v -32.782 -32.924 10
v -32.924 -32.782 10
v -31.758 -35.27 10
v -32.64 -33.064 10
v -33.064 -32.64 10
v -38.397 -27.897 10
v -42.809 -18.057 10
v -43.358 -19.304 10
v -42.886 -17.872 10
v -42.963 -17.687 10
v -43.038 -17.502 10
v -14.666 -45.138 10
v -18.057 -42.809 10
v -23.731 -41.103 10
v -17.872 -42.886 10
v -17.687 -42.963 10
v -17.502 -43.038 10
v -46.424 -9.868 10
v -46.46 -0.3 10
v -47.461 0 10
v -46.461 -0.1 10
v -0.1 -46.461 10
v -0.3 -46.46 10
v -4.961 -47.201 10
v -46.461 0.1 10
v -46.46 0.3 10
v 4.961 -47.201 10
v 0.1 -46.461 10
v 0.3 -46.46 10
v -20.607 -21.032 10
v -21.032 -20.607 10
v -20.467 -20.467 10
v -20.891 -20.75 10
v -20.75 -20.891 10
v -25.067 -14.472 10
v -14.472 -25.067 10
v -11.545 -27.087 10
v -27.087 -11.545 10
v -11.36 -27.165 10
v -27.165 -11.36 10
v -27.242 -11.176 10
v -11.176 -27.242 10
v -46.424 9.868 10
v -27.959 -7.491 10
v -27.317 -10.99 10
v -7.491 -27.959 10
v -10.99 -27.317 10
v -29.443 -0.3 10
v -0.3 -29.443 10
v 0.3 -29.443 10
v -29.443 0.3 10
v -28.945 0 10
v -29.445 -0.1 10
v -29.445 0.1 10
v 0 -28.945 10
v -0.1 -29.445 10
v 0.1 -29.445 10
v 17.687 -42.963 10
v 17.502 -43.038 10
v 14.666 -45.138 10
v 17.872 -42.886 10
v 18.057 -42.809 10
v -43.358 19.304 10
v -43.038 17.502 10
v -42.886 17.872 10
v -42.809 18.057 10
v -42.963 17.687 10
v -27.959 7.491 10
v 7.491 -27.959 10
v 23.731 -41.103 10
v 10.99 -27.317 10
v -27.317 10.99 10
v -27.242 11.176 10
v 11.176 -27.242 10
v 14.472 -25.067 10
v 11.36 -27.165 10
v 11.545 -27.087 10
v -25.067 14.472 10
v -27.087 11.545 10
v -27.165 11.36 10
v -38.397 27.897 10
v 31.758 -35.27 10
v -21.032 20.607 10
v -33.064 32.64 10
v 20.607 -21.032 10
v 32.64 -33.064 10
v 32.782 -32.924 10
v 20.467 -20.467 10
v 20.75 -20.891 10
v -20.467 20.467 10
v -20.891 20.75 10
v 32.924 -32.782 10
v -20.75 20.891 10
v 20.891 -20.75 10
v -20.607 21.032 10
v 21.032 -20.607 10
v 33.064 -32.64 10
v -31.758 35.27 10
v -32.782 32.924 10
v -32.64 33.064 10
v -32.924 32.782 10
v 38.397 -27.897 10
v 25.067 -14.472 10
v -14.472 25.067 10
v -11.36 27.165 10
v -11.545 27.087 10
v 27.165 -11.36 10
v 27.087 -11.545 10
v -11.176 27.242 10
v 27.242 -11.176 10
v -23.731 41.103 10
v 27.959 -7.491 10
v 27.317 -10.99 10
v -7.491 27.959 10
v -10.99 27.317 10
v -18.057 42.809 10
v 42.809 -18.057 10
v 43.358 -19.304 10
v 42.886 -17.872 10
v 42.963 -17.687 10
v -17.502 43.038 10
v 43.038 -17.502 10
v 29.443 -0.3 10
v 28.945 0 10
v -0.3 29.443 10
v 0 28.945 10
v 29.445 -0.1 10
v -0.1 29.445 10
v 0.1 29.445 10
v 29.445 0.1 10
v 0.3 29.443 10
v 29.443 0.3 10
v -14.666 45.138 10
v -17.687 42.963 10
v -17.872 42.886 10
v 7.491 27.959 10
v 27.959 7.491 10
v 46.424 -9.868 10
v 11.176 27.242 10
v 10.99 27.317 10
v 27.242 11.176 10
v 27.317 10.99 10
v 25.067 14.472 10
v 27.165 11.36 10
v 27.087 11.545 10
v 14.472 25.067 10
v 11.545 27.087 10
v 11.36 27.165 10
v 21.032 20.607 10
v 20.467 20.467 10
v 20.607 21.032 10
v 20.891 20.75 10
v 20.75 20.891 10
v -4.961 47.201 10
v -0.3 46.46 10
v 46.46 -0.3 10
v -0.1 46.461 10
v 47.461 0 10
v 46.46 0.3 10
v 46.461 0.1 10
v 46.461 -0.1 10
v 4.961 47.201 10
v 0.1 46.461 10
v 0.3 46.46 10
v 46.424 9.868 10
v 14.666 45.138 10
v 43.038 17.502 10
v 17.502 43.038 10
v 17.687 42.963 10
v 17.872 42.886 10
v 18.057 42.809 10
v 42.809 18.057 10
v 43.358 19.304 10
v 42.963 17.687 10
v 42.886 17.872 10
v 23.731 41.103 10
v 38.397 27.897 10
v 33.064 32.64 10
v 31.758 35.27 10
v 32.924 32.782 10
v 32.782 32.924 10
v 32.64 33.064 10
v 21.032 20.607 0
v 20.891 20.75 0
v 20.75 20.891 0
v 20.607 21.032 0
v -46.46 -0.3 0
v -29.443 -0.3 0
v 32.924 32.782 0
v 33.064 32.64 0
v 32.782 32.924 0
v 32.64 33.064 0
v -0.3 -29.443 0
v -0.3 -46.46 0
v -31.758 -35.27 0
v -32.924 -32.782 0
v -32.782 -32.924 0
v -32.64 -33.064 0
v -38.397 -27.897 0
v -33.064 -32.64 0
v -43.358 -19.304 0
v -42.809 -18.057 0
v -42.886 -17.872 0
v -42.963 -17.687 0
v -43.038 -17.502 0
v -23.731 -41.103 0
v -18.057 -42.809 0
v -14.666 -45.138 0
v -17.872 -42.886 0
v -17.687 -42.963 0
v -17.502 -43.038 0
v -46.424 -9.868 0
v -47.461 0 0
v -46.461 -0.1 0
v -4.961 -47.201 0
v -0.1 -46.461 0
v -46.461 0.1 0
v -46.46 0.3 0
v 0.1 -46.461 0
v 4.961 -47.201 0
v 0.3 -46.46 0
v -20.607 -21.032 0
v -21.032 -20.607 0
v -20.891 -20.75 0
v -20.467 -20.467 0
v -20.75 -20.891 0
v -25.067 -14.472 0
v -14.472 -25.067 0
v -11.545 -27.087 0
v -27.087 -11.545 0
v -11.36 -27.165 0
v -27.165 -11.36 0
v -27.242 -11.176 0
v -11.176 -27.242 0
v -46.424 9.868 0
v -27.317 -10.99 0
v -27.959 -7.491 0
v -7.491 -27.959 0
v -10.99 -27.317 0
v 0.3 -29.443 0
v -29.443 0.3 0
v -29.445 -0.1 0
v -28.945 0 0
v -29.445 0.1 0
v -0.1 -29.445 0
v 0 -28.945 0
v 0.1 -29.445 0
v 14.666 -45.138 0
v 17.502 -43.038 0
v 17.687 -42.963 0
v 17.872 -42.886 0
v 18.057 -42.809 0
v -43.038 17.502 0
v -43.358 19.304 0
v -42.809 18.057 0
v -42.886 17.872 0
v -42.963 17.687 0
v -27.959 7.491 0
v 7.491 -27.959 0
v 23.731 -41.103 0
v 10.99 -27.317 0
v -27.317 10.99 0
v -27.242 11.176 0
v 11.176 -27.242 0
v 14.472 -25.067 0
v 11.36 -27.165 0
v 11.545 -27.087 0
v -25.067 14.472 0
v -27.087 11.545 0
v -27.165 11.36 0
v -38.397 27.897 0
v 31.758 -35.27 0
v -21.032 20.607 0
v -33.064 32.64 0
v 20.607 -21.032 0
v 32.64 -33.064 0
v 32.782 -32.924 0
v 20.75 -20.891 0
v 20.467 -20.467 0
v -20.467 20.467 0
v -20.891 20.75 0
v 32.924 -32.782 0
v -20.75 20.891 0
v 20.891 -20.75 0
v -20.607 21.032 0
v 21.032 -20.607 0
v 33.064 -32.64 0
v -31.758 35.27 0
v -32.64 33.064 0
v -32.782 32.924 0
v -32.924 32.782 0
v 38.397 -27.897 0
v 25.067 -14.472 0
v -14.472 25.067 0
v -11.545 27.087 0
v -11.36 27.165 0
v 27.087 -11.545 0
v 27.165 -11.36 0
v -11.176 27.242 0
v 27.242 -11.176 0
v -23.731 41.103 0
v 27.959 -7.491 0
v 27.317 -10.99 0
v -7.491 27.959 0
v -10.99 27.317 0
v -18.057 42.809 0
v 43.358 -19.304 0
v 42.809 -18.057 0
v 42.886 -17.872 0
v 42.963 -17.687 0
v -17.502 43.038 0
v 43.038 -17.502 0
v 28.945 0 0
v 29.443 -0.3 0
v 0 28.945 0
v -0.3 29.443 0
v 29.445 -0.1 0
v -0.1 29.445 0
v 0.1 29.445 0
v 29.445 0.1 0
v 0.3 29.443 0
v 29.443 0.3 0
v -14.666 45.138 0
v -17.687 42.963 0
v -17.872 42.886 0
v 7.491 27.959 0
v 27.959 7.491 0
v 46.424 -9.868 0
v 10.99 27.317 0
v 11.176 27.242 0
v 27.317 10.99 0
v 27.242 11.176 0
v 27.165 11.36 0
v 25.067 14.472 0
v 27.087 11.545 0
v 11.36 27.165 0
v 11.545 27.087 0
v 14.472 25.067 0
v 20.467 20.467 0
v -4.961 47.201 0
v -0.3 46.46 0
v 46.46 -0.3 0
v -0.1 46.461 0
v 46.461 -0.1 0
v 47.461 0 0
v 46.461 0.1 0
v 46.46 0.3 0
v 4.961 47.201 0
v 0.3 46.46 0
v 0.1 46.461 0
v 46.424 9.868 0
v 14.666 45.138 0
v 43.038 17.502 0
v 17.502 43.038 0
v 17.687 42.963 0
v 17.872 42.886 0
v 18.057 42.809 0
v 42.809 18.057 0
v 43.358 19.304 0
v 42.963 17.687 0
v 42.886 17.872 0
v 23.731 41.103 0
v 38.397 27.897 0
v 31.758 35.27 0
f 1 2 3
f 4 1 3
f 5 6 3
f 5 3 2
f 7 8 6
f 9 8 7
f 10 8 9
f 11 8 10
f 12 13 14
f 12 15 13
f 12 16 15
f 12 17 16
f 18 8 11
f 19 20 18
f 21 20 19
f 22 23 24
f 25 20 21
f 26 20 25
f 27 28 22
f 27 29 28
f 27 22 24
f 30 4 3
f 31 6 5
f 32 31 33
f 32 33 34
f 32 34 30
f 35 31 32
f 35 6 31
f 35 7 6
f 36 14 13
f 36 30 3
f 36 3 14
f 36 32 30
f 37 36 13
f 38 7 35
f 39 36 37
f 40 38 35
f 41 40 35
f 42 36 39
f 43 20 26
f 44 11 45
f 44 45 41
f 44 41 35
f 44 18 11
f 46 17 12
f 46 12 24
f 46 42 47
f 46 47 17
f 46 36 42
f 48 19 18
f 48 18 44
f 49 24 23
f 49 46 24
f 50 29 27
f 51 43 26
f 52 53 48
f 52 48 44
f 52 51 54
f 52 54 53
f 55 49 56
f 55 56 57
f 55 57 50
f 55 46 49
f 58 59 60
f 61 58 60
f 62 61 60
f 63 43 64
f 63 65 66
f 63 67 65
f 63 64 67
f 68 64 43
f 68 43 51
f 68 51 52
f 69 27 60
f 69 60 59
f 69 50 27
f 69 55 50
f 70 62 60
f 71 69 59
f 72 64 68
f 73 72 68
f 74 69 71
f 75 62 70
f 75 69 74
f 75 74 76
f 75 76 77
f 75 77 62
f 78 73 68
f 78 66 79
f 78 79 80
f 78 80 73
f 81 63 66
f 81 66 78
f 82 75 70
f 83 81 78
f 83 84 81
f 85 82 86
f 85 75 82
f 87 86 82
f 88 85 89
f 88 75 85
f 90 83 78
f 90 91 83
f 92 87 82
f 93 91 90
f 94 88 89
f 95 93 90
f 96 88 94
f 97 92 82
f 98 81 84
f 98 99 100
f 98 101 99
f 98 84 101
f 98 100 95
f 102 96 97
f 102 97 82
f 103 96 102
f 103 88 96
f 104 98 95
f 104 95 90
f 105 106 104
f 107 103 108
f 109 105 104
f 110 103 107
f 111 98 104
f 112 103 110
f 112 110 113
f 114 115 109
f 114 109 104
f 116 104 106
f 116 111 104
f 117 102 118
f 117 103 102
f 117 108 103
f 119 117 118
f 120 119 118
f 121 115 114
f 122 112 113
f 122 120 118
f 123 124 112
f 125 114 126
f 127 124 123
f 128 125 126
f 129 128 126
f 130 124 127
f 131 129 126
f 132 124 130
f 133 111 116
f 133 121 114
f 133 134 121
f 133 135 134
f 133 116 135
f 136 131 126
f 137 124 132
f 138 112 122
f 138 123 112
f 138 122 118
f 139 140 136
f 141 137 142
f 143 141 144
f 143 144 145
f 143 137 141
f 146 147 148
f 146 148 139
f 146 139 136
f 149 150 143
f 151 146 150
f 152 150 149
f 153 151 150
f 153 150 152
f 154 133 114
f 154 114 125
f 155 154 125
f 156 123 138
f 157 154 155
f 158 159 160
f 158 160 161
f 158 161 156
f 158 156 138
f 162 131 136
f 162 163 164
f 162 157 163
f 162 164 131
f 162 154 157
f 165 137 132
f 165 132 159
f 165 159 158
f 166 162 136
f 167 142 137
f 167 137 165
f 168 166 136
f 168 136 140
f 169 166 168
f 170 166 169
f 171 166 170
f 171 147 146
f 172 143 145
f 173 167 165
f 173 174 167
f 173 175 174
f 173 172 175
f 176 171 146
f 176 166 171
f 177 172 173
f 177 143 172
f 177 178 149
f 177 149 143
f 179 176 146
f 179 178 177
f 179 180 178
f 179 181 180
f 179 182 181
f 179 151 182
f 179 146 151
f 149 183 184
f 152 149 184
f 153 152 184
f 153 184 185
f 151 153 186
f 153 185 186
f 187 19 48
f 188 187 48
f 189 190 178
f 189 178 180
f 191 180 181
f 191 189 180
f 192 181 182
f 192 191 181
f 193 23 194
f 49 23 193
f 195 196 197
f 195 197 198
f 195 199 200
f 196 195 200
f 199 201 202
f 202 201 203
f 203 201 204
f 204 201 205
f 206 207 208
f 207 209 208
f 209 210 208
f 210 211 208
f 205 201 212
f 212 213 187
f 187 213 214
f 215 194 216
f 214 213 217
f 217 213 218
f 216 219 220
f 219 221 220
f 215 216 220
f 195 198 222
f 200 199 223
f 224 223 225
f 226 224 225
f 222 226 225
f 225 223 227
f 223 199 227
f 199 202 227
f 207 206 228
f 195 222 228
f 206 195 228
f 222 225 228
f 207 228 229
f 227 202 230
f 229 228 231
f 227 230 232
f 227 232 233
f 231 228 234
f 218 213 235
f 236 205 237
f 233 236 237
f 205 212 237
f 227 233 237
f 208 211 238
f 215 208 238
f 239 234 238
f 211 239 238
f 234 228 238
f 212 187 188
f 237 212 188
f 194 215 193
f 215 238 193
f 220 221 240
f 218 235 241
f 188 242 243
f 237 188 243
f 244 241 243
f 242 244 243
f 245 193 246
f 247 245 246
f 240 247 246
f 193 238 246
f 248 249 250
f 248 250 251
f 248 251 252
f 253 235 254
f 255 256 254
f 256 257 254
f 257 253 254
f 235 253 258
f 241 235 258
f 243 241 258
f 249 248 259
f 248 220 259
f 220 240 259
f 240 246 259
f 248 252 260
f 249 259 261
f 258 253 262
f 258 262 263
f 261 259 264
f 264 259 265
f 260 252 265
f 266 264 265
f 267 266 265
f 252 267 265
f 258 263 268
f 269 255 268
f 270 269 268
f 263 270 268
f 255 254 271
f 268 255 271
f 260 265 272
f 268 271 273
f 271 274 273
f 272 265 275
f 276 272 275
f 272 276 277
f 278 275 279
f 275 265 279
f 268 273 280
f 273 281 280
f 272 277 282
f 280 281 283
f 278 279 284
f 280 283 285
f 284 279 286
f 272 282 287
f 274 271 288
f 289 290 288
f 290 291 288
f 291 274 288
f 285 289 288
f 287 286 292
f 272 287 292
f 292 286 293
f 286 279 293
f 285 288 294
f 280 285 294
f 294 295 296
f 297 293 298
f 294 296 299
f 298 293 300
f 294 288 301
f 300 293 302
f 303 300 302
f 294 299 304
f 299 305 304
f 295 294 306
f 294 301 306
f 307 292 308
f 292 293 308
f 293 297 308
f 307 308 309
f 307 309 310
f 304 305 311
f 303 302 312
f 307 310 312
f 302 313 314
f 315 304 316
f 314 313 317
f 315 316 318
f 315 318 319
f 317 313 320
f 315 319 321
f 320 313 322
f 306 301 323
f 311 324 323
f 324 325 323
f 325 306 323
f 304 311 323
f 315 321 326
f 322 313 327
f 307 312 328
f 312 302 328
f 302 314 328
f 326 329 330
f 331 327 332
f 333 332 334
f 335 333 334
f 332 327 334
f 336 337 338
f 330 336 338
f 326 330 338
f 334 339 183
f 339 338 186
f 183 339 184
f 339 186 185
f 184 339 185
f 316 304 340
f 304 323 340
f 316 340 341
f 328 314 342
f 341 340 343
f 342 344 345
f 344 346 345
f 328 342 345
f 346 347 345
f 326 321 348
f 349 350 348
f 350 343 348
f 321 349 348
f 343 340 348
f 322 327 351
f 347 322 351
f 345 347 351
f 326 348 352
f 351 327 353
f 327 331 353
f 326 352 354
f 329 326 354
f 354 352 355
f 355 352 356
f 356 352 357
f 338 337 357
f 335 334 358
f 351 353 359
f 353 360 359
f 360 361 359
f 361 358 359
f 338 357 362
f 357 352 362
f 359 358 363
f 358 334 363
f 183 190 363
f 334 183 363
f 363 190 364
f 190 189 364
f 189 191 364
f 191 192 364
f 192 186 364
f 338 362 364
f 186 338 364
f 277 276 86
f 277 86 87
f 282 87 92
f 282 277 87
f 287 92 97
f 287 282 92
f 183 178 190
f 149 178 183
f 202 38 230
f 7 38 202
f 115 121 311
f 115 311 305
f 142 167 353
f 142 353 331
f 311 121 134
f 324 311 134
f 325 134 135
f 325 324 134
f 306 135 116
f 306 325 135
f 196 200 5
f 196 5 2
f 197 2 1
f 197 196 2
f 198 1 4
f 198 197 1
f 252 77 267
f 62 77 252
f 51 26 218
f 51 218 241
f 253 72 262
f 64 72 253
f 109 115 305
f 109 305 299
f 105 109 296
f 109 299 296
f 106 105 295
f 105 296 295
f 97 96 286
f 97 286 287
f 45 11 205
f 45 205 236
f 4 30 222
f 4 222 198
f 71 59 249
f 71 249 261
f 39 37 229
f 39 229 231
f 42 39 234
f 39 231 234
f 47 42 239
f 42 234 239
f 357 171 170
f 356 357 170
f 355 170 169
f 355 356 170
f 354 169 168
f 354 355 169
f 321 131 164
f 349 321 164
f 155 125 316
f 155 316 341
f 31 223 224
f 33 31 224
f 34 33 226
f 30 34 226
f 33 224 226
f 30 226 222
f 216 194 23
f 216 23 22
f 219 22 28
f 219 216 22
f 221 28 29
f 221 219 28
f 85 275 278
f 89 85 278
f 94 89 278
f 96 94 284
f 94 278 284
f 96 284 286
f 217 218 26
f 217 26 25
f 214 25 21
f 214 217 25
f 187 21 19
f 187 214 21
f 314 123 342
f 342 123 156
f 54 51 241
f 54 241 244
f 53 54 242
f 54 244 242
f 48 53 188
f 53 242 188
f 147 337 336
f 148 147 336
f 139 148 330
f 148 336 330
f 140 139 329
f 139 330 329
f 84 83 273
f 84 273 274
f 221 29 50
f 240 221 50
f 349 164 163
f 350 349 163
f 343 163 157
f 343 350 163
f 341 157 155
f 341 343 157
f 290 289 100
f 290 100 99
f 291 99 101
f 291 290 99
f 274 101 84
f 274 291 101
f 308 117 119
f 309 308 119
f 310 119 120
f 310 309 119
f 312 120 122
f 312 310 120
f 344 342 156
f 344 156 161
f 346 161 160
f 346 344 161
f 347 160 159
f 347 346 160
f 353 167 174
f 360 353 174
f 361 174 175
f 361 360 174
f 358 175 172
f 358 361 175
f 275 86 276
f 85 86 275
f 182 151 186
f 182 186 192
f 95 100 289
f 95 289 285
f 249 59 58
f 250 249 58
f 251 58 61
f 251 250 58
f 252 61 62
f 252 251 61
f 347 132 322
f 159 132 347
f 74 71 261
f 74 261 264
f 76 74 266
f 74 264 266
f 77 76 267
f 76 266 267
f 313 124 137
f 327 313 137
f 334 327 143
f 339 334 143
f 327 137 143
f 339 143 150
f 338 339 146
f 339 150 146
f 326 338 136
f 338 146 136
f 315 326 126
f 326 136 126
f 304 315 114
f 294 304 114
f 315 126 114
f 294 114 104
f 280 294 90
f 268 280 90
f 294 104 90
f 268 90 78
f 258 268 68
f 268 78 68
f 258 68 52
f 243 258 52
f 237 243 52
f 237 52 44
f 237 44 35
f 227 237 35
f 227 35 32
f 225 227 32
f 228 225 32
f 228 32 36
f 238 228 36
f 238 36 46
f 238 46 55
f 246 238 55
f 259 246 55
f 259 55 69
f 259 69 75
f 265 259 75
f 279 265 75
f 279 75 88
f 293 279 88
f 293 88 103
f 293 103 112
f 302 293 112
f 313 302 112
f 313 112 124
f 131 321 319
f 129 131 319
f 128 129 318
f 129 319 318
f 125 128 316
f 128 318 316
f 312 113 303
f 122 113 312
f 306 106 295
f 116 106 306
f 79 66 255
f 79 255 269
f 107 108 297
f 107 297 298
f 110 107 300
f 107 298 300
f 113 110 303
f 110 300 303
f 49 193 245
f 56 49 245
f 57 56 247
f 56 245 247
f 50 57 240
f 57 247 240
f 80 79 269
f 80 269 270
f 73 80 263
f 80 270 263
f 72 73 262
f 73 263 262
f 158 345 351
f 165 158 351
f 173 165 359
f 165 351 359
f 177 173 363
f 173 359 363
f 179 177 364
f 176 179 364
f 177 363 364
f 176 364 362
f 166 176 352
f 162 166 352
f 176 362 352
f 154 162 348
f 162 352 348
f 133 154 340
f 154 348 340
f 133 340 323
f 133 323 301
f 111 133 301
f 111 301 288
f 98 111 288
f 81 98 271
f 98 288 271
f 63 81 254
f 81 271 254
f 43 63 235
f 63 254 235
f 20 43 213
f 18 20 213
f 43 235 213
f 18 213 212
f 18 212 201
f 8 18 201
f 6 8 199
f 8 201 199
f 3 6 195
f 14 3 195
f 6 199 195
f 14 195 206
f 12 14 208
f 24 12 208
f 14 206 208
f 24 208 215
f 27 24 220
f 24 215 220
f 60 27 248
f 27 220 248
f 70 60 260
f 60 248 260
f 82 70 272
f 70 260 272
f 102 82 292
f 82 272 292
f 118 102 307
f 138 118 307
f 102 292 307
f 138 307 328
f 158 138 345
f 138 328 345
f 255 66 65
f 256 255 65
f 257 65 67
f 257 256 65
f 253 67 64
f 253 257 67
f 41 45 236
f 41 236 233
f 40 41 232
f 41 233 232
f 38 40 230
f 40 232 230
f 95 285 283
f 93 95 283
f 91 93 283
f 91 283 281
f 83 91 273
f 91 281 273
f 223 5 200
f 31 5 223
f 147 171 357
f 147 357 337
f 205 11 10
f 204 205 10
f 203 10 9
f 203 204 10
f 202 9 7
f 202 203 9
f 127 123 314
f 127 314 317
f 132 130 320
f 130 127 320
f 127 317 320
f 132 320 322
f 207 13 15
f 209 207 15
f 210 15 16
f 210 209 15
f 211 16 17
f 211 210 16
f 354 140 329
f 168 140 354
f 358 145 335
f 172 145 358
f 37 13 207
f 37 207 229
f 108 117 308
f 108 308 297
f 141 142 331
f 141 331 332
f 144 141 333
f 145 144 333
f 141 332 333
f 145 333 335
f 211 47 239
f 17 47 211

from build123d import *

# Parameters (mm, degrees)
ESQUISSE1_R             = 46.46108
BOSS_EXTRU_1_DEPTH      = 10
ESQUISSE2_R             = 29.44481
ENL_V_MAT_EXTRU_1_DEPTH = 67.462500025
ESQUISSE4_W             = 0.6
ESQUISSE4_H             = 40
ESQUISSE4_W_2           = 40
ESQUISSE4_H_2           = 0.6
ENL_V_MAT_EXTRU_2_DEPTH = 10
ESQUISSE5_R             = 29.44481
BOSS_EXTRU_2_DEPTH      = 10
ESQUISSE6_R             = 28.94481
ENL_V_MAT_EXTRU_3_DEPTH = 67.461145864
ESQUISSE7_R             = 47.46108
ESQUISSE7_R_2           = 46.46108
BOSS_EXTRU_3_DEPTH      = 10


with BuildPart() as part:
    # Esquisse1 → Boss.-Extru.1 (new body)
    with BuildSketch(Plane.XY):
        Circle(ESQUISSE1_R)
    extrude(amount=BOSS_EXTRU_1_DEPTH)

    # Esquisse2 → Enlèv. mat.-Extru.1 (cut, through all)
    with BuildSketch(Plane.XY.offset(10)):
        Circle(ESQUISSE2_R)
    extrude(amount=-ENL_V_MAT_EXTRU_1_DEPTH, mode=Mode.SUBTRACT)

    # Esquisse4 → Enlèv. mat.-Extru.2 (cut)
    with BuildSketch(Plane.XY.offset(10)):
        Polygon((23.238169802, 55.317966921), (7.930832507, 18.362785621), (7.376504788, 18.59239568), (22.683842082, 55.54757698), align=None)
        with Locations((0, 40)):
            Rectangle(ESQUISSE4_W, ESQUISSE4_H)
        Polygon((42.638538906, 42.214274837), (14.354267658, 13.930003589), (13.930003589, 14.354267658), (42.214274837, 42.638538906), align=None)
        Polygon((55.54757698, 22.683842082), (18.59239568, 7.376504788), (18.362785621, 7.930832507), (55.317966921, 23.238169802), align=None)
        with Locations((40, 0)):
            Rectangle(ESQUISSE4_W_2, ESQUISSE4_H_2)
        Polygon((55.317966921, -23.238169802), (18.362785621, -7.930832507), (18.59239568, -7.376504788), (55.54757698, -22.683842082), align=None)
        Polygon((42.214274837, -42.638538906), (13.930003589, -14.354267658), (14.354267658, -13.930003589), (42.638538906, -42.214274837), align=None)
        Polygon((22.683842082, -55.54757698), (7.376504788, -18.59239568), (7.930832507, -18.362785621), (23.238169802, -55.317966921), align=None)
        with Locations((0, -40)):
            Rectangle(ESQUISSE4_W, ESQUISSE4_H)
        Polygon((-23.238169802, -55.317966921), (-7.930832507, -18.362785621), (-7.376504788, -18.59239568), (-22.683842082, -55.54757698), align=None)
        Polygon((-42.638538906, -42.214274837), (-14.354267658, -13.930003589), (-13.930003589, -14.354267658), (-42.214274837, -42.638538906), align=None)
        Polygon((-55.54757698, -22.683842082), (-18.59239568, -7.376504788), (-18.362785621, -7.930832507), (-55.317966921, -23.238169802), align=None)
        with Locations((-40, 0)):
            Rectangle(ESQUISSE4_W_2, ESQUISSE4_H_2)
        Polygon((-55.317966921, 23.238169802), (-18.362785621, 7.930832507), (-18.59239568, 7.376504788), (-55.54757698, 22.683842082), align=None)
        Polygon((-42.214274837, 42.638538906), (-13.930003589, 14.354267658), (-14.354267658, 13.930003589), (-42.638538906, 42.214274837), align=None)
        Polygon((-22.683842082, 55.54757698), (-7.376504788, 18.59239568), (-7.930832507, 18.362785621), (-23.238169802, 55.317966921), align=None)
    extrude(amount=-ENL_V_MAT_EXTRU_2_DEPTH, mode=Mode.SUBTRACT)


with BuildPart() as enl_v_mat_extru_2_piece_1:
    # of the separate pieces the step leaves, piece 1, a body of its own (enl_v_mat_extru_2_pieces)
    add(part.part.solids().sort_by_distance((-32.640127818, -33.064391886, 0))[0])



with BuildPart() as enl_v_mat_extru_2_piece_2:
    # of the separate pieces the step leaves, piece 2, a body of its own (enl_v_mat_extru_2_pieces)
    add(part.part.solids().sort_by_distance((-18.056678773, 42.808741005, 0))[0])


with BuildPart() as enl_v_mat_extru_2_piece_3:
    # of the separate pieces the step leaves, piece 3, a body of its own (enl_v_mat_extru_2_pieces)
    add(part.part.solids().sort_by_distance((-42.808741005, -18.056678773, 0))[0])


with BuildPart() as enl_v_mat_extru_2_piece_4:
    # of the separate pieces the step leaves, piece 4, a body of its own (enl_v_mat_extru_2_pieces)
    add(part.part.solids().sort_by_distance((-33.064391886, 32.640127818, 0))[0])


with BuildPart() as enl_v_mat_extru_2_piece_5:
    # of the separate pieces the step leaves, piece 5, a body of its own (enl_v_mat_extru_2_pieces)
    add(part.part.solids().sort_by_distance((17.502351053, 43.038351065, 0))[0])


with BuildPart() as enl_v_mat_extru_2_piece_6:
    # of the separate pieces the step leaves, piece 6, a body of its own (enl_v_mat_extru_2_pieces)
    add(part.part.solids().sort_by_distance((0.3, -46.460111437, 0))[0])


with BuildPart() as enl_v_mat_extru_2_piece_7:
    # of the separate pieces the step leaves, piece 7, a body of its own (enl_v_mat_extru_2_pieces)
    add(part.part.solids().sort_by_distance((-0.3, 46.460111437, 0))[0])


with BuildPart() as enl_v_mat_extru_2_piece_8:
    # of the separate pieces the step leaves, piece 8, a body of its own (enl_v_mat_extru_2_pieces)
    add(part.part.solids().sort_by_distance((46.460111437, 0.3, 0))[0])


with BuildPart() as enl_v_mat_extru_2_piece_9:
    # of the separate pieces the step leaves, piece 9, a body of its own (enl_v_mat_extru_2_pieces)
    add(part.part.solids().sort_by_distance((43.038351065, -17.502351053, 0))[0])


with BuildPart() as enl_v_mat_extru_2_piece_10:
    # of the separate pieces the step leaves, piece 10, a body of its own (enl_v_mat_extru_2_pieces)
    add(part.part.solids().sort_by_distance((-17.502351053, -43.038351065, 0))[0])


with BuildPart() as enl_v_mat_extru_2_piece_11:
    # of the separate pieces the step leaves, piece 11, a body of its own (enl_v_mat_extru_2_pieces)
    add(part.part.solids().sort_by_distance((32.640127818, 33.064391886, 0))[0])


with BuildPart() as enl_v_mat_extru_2_piece_12:
    # of the separate pieces the step leaves, piece 12, a body of its own (enl_v_mat_extru_2_pieces)
    add(part.part.solids().sort_by_distance((42.808741005, 18.056678773, 0))[0])


with BuildPart() as enl_v_mat_extru_2_piece_13:
    # of the separate pieces the step leaves, piece 13, a body of its own (enl_v_mat_extru_2_pieces)
    add(part.part.solids().sort_by_distance((18.056678773, -42.808741005, 0))[0])


with BuildPart() as enl_v_mat_extru_2_piece_14:
    # of the separate pieces the step leaves, piece 14, a body of its own (enl_v_mat_extru_2_pieces)
    add(part.part.solids().sort_by_distance((33.064391886, -32.640127818, 0))[0])


with BuildPart() as enl_v_mat_extru_2_piece_15:
    # of the separate pieces the step leaves, piece 15, a body of its own (enl_v_mat_extru_2_pieces)
    add(part.part.solids().sort_by_distance((-46.460111437, -0.3, 0))[0])


with BuildPart() as enl_v_mat_extru_2_piece_16:
    # of the separate pieces the step leaves, piece 16, a body of its own (enl_v_mat_extru_2_pieces)
    add(part.part.solids().sort_by_distance((-43.038351065, 17.502351053, 0))[0])


with BuildPart() as enl_v_mat_extru_2_piece_1_1:
    add(enl_v_mat_extru_2_piece_1.part)

    add(enl_v_mat_extru_2_piece_2.part)  # Boss.-Extru.2 merges Enlèv. mat.-Extru.2 piece 2

    add(enl_v_mat_extru_2_piece_3.part)  # Boss.-Extru.2 merges Enlèv. mat.-Extru.2 piece 3

    add(enl_v_mat_extru_2_piece_4.part)  # Boss.-Extru.2 merges Enlèv. mat.-Extru.2 piece 4

    add(enl_v_mat_extru_2_piece_5.part)  # Boss.-Extru.2 merges Enlèv. mat.-Extru.2 piece 5

    add(enl_v_mat_extru_2_piece_6.part)  # Boss.-Extru.2 merges Enlèv. mat.-Extru.2 piece 6

    add(enl_v_mat_extru_2_piece_7.part)  # Boss.-Extru.2 merges Enlèv. mat.-Extru.2 piece 7

    add(enl_v_mat_extru_2_piece_8.part)  # Boss.-Extru.2 merges Enlèv. mat.-Extru.2 piece 8

    add(enl_v_mat_extru_2_piece_9.part)  # Boss.-Extru.2 merges Enlèv. mat.-Extru.2 piece 9

    add(enl_v_mat_extru_2_piece_10.part)  # Boss.-Extru.2 merges Enlèv. mat.-Extru.2 piece 10

    add(enl_v_mat_extru_2_piece_11.part)  # Boss.-Extru.2 merges Enlèv. mat.-Extru.2 piece 11

    add(enl_v_mat_extru_2_piece_12.part)  # Boss.-Extru.2 merges Enlèv. mat.-Extru.2 piece 12

    add(enl_v_mat_extru_2_piece_13.part)  # Boss.-Extru.2 merges Enlèv. mat.-Extru.2 piece 13

    add(enl_v_mat_extru_2_piece_14.part)  # Boss.-Extru.2 merges Enlèv. mat.-Extru.2 piece 14

    add(enl_v_mat_extru_2_piece_15.part)  # Boss.-Extru.2 merges Enlèv. mat.-Extru.2 piece 15

    add(enl_v_mat_extru_2_piece_16.part)  # Boss.-Extru.2 merges Enlèv. mat.-Extru.2 piece 16
    # Esquisse5 → Boss.-Extru.2 (add)
    with BuildSketch(Plane.XY):
        Circle(ESQUISSE5_R)
    extrude(amount=BOSS_EXTRU_2_DEPTH)

    # Esquisse6 → Enlèv. mat.-Extru.3 (cut, through all)
    with BuildSketch(Plane.XY.offset(10)):
        Circle(ESQUISSE6_R)
    extrude(amount=-ENL_V_MAT_EXTRU_3_DEPTH, mode=Mode.SUBTRACT)

    # Esquisse7 → Boss.-Extru.3 (add)
    with BuildSketch(Plane.XY):
        Circle(ESQUISSE7_R)
        Circle(ESQUISSE7_R_2, mode=Mode.SUBTRACT)
    extrude(amount=BOSS_EXTRU_3_DEPTH)


solid = enl_v_mat_extru_2_piece_1_1.part
